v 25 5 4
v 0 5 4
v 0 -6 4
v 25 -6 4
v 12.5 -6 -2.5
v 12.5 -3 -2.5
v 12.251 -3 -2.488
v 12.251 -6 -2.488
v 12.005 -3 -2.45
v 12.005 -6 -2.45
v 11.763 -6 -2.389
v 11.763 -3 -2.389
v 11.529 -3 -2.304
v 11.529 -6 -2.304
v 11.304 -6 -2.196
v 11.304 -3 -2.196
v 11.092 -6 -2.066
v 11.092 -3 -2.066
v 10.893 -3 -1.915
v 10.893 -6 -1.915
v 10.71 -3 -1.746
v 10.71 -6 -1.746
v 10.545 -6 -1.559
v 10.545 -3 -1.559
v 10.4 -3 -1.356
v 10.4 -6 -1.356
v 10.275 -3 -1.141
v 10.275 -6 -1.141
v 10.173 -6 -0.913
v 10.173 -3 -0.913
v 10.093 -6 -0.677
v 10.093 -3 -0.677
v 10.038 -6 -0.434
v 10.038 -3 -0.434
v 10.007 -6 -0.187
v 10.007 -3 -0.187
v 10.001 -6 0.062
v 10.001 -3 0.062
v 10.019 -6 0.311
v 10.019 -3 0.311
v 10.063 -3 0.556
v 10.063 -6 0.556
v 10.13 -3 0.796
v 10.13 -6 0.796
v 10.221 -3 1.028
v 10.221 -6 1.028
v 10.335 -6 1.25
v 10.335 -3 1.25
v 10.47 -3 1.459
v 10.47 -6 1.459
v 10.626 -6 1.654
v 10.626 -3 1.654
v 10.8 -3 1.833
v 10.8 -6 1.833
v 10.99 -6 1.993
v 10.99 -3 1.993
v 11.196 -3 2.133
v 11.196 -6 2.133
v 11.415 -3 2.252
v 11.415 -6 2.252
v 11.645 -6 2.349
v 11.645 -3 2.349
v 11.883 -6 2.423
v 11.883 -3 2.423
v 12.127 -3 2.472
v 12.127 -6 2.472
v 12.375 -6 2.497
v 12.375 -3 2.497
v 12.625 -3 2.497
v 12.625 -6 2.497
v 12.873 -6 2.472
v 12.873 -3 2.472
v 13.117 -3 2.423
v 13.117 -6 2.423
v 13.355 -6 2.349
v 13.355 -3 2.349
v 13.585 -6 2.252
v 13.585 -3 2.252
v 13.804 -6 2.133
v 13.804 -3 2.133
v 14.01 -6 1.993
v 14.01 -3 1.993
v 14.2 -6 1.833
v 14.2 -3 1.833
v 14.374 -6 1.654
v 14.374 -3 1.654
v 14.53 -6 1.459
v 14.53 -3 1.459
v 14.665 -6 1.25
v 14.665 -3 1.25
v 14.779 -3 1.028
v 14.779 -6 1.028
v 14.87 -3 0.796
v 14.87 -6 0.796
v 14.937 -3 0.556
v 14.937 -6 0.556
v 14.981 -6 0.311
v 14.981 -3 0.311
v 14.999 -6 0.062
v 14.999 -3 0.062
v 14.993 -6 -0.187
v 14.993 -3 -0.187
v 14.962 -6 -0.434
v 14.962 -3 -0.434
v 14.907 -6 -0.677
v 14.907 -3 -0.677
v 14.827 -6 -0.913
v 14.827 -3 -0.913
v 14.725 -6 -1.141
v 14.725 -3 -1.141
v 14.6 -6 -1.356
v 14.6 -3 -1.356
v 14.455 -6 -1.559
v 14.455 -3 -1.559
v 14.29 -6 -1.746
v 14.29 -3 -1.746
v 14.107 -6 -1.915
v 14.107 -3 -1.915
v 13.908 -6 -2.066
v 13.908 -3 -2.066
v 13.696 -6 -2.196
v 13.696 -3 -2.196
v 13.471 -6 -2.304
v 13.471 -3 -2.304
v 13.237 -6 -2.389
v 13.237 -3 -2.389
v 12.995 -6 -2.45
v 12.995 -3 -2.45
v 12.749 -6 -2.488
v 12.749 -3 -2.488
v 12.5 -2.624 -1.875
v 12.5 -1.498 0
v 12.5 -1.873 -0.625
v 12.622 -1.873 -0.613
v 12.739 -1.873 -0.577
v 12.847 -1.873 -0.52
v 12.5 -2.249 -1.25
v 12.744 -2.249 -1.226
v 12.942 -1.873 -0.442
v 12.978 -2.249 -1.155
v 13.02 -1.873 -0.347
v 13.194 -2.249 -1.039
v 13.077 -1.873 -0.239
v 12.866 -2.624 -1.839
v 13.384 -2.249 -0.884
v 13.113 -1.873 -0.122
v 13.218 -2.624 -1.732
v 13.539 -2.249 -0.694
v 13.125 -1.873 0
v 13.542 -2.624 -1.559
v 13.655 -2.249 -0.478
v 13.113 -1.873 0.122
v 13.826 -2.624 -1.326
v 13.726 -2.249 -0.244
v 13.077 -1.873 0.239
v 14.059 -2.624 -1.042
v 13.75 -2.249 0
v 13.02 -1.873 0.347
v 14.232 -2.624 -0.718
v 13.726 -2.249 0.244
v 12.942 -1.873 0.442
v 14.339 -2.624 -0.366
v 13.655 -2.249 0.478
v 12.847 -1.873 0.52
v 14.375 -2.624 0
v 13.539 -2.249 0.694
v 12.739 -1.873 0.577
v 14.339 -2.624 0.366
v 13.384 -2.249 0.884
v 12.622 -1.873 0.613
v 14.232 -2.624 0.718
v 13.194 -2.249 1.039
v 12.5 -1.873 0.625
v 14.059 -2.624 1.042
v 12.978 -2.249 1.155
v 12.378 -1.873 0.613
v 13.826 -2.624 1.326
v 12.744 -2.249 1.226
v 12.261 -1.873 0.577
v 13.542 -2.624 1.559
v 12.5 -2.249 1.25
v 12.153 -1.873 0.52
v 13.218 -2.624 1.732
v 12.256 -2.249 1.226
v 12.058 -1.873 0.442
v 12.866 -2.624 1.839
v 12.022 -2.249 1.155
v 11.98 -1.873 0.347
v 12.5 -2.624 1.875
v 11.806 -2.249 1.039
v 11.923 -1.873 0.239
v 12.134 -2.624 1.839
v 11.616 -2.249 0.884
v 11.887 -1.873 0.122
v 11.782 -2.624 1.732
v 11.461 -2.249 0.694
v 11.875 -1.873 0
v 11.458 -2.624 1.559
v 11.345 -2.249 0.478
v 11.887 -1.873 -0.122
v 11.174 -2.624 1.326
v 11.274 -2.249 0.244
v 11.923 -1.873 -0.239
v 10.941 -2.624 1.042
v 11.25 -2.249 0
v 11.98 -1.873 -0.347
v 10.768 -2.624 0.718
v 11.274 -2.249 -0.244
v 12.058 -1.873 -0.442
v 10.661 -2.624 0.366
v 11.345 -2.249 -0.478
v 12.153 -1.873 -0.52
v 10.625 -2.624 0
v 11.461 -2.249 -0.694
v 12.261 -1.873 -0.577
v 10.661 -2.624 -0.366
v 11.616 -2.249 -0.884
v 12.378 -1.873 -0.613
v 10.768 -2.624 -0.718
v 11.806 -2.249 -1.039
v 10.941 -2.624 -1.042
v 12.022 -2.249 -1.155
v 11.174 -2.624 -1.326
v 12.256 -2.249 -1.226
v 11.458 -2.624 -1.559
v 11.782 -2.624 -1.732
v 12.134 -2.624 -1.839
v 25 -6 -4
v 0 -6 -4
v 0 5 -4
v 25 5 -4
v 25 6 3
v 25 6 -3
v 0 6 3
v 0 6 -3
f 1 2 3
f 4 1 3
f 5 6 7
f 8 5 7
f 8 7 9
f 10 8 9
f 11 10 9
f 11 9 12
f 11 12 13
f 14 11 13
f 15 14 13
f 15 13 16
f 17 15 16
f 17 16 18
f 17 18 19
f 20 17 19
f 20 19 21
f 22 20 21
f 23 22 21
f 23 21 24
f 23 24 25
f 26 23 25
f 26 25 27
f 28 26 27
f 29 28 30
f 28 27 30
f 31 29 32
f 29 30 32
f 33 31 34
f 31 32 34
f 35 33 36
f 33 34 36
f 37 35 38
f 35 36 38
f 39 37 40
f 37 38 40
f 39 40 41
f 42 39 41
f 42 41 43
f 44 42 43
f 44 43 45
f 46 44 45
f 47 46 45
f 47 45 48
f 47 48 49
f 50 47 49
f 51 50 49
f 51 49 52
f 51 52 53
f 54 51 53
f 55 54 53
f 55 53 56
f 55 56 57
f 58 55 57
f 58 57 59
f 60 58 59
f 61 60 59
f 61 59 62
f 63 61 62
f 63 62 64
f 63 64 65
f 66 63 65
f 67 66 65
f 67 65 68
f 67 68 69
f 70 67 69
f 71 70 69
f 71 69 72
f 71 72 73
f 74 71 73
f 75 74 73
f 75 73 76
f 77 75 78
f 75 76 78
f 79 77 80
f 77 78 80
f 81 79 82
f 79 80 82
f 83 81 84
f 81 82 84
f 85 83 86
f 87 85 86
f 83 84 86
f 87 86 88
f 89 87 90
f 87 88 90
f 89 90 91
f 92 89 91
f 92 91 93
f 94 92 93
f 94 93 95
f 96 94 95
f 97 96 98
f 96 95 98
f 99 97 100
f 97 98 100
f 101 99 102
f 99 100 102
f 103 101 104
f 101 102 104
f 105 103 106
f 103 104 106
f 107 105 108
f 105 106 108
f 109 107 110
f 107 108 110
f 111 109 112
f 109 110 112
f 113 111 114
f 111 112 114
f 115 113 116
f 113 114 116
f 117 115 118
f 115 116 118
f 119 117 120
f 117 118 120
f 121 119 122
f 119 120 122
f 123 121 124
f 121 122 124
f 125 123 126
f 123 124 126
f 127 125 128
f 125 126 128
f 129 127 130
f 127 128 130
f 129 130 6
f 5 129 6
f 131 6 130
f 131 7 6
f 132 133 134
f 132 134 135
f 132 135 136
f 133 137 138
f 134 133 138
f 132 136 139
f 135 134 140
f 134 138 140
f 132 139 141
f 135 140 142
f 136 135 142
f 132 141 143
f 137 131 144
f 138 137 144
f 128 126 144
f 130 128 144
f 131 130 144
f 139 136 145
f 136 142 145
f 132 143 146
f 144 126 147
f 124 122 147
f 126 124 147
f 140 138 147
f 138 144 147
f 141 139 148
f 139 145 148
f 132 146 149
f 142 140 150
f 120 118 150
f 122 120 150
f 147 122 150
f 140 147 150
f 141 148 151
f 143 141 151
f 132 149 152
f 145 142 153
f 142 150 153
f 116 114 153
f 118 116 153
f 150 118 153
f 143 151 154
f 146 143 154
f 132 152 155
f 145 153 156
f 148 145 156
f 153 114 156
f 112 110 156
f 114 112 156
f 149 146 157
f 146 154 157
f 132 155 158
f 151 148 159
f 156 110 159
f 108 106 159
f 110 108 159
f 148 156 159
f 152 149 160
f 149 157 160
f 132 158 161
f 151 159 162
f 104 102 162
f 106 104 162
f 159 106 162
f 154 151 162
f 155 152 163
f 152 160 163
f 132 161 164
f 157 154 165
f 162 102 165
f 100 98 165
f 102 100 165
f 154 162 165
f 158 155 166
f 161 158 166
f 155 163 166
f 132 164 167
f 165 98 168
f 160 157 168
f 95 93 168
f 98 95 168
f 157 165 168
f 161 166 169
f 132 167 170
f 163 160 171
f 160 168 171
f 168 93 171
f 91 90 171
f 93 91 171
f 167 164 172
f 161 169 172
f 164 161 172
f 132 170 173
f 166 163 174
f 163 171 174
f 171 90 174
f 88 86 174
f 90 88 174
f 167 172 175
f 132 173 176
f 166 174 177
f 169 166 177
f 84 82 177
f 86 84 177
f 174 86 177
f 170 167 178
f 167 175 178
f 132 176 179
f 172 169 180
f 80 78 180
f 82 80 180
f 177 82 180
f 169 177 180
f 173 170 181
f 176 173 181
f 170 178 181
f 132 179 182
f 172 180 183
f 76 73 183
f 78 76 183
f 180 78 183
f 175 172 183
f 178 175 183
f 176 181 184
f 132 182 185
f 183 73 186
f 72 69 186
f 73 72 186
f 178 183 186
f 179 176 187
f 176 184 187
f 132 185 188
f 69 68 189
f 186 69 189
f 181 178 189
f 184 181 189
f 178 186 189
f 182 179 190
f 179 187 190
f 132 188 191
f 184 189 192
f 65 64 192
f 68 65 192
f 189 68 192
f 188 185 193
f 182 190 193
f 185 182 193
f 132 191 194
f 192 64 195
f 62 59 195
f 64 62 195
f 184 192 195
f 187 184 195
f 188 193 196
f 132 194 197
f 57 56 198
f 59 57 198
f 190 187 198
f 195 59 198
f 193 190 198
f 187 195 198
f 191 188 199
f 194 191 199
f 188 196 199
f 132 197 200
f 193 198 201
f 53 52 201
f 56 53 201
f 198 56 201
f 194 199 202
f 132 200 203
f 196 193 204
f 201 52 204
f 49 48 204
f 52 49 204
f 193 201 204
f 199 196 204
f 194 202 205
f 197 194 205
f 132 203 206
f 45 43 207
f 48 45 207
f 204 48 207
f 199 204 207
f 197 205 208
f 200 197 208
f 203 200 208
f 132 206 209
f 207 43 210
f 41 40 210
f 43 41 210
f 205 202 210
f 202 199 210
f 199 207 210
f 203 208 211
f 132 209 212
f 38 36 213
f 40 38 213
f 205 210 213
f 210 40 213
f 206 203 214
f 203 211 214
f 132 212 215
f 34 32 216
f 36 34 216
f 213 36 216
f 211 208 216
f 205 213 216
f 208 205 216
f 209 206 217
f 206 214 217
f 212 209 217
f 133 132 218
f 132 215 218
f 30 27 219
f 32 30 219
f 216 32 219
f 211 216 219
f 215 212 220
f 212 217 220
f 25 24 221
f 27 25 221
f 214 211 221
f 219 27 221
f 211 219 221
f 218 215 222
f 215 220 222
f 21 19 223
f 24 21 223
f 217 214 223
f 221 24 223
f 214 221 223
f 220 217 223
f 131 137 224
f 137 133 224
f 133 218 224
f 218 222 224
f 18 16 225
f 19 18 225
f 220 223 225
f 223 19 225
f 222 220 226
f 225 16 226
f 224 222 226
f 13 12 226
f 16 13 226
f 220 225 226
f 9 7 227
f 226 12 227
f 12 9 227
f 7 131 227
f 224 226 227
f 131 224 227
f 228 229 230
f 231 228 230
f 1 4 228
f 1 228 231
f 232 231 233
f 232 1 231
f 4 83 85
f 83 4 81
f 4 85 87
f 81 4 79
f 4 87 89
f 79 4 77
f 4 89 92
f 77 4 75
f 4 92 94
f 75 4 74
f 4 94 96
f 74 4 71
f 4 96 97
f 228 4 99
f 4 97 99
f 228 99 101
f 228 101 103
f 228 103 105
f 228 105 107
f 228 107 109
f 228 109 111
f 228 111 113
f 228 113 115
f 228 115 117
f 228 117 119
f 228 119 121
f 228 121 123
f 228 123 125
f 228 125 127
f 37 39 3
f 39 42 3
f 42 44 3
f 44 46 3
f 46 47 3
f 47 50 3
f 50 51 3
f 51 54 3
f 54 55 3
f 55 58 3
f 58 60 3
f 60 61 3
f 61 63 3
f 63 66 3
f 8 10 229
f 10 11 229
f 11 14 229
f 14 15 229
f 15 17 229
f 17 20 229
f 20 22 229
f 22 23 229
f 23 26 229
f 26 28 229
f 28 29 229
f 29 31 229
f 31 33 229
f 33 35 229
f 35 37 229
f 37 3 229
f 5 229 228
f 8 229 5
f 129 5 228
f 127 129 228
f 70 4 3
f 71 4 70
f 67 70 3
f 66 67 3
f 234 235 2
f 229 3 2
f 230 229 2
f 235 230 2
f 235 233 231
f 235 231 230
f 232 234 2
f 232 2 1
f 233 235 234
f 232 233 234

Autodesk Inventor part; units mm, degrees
ref_plane "YZ Plane" through (0, 0, 0) normal (1, 0, 0) x (0, 1, 0)
ref_plane "XZ Plane" through (0, 0, 0) normal (0, 1, 0) x (-1, 0, 0)
ref_plane "XY Plane" through (0, 0, 0) normal (0, 0, 1) x (1, 0, 0)
sketch "Sketch1" plane through (0, 0, 0) normal (1, 0, 0) x (0, 1, 0)
  line L0 (-6, -4) -> (6, -4)
  line L1 (6, -4) -> (6, 4)
  line L2 (6, 4) -> (-6, 4)
  line L3 (-6, 4) -> (-6, -4)
  line L4 (-6, -4) -> (6, 4) construction
  line L5 (6, -4) -> (-6, 4) construction
  point P0 (0, 0)
  dimension "d0" = 12
  dimension "d1" = 8
extrude "Extrusion1" add sketch "Sketch1" along normal blind 25
sketch "Sketch2" plane through (0, -6, -4) normal (0, -1, 0) x (1, 0, 0)
  line L0 (0, 8) -> (25, 8) projected
  line L1 (0, 8) -> (0, 0) projected
  point P0 (0, 4)
  point P1 (12.5, 4)
  point P2 (12.5, 8)
  point P3 (0, 4)
hole "Hole1" at (12.5, -6, 0) direction (0, 1, 0) diameter 5 depth 3 tip angle 118
chamfer "Chamfer1" distance 1 angle 45 2 edges at (12.5, 6, -4) (12.5, 6, 4)
properties part number "Jaw" material "Aluminum 6061"
